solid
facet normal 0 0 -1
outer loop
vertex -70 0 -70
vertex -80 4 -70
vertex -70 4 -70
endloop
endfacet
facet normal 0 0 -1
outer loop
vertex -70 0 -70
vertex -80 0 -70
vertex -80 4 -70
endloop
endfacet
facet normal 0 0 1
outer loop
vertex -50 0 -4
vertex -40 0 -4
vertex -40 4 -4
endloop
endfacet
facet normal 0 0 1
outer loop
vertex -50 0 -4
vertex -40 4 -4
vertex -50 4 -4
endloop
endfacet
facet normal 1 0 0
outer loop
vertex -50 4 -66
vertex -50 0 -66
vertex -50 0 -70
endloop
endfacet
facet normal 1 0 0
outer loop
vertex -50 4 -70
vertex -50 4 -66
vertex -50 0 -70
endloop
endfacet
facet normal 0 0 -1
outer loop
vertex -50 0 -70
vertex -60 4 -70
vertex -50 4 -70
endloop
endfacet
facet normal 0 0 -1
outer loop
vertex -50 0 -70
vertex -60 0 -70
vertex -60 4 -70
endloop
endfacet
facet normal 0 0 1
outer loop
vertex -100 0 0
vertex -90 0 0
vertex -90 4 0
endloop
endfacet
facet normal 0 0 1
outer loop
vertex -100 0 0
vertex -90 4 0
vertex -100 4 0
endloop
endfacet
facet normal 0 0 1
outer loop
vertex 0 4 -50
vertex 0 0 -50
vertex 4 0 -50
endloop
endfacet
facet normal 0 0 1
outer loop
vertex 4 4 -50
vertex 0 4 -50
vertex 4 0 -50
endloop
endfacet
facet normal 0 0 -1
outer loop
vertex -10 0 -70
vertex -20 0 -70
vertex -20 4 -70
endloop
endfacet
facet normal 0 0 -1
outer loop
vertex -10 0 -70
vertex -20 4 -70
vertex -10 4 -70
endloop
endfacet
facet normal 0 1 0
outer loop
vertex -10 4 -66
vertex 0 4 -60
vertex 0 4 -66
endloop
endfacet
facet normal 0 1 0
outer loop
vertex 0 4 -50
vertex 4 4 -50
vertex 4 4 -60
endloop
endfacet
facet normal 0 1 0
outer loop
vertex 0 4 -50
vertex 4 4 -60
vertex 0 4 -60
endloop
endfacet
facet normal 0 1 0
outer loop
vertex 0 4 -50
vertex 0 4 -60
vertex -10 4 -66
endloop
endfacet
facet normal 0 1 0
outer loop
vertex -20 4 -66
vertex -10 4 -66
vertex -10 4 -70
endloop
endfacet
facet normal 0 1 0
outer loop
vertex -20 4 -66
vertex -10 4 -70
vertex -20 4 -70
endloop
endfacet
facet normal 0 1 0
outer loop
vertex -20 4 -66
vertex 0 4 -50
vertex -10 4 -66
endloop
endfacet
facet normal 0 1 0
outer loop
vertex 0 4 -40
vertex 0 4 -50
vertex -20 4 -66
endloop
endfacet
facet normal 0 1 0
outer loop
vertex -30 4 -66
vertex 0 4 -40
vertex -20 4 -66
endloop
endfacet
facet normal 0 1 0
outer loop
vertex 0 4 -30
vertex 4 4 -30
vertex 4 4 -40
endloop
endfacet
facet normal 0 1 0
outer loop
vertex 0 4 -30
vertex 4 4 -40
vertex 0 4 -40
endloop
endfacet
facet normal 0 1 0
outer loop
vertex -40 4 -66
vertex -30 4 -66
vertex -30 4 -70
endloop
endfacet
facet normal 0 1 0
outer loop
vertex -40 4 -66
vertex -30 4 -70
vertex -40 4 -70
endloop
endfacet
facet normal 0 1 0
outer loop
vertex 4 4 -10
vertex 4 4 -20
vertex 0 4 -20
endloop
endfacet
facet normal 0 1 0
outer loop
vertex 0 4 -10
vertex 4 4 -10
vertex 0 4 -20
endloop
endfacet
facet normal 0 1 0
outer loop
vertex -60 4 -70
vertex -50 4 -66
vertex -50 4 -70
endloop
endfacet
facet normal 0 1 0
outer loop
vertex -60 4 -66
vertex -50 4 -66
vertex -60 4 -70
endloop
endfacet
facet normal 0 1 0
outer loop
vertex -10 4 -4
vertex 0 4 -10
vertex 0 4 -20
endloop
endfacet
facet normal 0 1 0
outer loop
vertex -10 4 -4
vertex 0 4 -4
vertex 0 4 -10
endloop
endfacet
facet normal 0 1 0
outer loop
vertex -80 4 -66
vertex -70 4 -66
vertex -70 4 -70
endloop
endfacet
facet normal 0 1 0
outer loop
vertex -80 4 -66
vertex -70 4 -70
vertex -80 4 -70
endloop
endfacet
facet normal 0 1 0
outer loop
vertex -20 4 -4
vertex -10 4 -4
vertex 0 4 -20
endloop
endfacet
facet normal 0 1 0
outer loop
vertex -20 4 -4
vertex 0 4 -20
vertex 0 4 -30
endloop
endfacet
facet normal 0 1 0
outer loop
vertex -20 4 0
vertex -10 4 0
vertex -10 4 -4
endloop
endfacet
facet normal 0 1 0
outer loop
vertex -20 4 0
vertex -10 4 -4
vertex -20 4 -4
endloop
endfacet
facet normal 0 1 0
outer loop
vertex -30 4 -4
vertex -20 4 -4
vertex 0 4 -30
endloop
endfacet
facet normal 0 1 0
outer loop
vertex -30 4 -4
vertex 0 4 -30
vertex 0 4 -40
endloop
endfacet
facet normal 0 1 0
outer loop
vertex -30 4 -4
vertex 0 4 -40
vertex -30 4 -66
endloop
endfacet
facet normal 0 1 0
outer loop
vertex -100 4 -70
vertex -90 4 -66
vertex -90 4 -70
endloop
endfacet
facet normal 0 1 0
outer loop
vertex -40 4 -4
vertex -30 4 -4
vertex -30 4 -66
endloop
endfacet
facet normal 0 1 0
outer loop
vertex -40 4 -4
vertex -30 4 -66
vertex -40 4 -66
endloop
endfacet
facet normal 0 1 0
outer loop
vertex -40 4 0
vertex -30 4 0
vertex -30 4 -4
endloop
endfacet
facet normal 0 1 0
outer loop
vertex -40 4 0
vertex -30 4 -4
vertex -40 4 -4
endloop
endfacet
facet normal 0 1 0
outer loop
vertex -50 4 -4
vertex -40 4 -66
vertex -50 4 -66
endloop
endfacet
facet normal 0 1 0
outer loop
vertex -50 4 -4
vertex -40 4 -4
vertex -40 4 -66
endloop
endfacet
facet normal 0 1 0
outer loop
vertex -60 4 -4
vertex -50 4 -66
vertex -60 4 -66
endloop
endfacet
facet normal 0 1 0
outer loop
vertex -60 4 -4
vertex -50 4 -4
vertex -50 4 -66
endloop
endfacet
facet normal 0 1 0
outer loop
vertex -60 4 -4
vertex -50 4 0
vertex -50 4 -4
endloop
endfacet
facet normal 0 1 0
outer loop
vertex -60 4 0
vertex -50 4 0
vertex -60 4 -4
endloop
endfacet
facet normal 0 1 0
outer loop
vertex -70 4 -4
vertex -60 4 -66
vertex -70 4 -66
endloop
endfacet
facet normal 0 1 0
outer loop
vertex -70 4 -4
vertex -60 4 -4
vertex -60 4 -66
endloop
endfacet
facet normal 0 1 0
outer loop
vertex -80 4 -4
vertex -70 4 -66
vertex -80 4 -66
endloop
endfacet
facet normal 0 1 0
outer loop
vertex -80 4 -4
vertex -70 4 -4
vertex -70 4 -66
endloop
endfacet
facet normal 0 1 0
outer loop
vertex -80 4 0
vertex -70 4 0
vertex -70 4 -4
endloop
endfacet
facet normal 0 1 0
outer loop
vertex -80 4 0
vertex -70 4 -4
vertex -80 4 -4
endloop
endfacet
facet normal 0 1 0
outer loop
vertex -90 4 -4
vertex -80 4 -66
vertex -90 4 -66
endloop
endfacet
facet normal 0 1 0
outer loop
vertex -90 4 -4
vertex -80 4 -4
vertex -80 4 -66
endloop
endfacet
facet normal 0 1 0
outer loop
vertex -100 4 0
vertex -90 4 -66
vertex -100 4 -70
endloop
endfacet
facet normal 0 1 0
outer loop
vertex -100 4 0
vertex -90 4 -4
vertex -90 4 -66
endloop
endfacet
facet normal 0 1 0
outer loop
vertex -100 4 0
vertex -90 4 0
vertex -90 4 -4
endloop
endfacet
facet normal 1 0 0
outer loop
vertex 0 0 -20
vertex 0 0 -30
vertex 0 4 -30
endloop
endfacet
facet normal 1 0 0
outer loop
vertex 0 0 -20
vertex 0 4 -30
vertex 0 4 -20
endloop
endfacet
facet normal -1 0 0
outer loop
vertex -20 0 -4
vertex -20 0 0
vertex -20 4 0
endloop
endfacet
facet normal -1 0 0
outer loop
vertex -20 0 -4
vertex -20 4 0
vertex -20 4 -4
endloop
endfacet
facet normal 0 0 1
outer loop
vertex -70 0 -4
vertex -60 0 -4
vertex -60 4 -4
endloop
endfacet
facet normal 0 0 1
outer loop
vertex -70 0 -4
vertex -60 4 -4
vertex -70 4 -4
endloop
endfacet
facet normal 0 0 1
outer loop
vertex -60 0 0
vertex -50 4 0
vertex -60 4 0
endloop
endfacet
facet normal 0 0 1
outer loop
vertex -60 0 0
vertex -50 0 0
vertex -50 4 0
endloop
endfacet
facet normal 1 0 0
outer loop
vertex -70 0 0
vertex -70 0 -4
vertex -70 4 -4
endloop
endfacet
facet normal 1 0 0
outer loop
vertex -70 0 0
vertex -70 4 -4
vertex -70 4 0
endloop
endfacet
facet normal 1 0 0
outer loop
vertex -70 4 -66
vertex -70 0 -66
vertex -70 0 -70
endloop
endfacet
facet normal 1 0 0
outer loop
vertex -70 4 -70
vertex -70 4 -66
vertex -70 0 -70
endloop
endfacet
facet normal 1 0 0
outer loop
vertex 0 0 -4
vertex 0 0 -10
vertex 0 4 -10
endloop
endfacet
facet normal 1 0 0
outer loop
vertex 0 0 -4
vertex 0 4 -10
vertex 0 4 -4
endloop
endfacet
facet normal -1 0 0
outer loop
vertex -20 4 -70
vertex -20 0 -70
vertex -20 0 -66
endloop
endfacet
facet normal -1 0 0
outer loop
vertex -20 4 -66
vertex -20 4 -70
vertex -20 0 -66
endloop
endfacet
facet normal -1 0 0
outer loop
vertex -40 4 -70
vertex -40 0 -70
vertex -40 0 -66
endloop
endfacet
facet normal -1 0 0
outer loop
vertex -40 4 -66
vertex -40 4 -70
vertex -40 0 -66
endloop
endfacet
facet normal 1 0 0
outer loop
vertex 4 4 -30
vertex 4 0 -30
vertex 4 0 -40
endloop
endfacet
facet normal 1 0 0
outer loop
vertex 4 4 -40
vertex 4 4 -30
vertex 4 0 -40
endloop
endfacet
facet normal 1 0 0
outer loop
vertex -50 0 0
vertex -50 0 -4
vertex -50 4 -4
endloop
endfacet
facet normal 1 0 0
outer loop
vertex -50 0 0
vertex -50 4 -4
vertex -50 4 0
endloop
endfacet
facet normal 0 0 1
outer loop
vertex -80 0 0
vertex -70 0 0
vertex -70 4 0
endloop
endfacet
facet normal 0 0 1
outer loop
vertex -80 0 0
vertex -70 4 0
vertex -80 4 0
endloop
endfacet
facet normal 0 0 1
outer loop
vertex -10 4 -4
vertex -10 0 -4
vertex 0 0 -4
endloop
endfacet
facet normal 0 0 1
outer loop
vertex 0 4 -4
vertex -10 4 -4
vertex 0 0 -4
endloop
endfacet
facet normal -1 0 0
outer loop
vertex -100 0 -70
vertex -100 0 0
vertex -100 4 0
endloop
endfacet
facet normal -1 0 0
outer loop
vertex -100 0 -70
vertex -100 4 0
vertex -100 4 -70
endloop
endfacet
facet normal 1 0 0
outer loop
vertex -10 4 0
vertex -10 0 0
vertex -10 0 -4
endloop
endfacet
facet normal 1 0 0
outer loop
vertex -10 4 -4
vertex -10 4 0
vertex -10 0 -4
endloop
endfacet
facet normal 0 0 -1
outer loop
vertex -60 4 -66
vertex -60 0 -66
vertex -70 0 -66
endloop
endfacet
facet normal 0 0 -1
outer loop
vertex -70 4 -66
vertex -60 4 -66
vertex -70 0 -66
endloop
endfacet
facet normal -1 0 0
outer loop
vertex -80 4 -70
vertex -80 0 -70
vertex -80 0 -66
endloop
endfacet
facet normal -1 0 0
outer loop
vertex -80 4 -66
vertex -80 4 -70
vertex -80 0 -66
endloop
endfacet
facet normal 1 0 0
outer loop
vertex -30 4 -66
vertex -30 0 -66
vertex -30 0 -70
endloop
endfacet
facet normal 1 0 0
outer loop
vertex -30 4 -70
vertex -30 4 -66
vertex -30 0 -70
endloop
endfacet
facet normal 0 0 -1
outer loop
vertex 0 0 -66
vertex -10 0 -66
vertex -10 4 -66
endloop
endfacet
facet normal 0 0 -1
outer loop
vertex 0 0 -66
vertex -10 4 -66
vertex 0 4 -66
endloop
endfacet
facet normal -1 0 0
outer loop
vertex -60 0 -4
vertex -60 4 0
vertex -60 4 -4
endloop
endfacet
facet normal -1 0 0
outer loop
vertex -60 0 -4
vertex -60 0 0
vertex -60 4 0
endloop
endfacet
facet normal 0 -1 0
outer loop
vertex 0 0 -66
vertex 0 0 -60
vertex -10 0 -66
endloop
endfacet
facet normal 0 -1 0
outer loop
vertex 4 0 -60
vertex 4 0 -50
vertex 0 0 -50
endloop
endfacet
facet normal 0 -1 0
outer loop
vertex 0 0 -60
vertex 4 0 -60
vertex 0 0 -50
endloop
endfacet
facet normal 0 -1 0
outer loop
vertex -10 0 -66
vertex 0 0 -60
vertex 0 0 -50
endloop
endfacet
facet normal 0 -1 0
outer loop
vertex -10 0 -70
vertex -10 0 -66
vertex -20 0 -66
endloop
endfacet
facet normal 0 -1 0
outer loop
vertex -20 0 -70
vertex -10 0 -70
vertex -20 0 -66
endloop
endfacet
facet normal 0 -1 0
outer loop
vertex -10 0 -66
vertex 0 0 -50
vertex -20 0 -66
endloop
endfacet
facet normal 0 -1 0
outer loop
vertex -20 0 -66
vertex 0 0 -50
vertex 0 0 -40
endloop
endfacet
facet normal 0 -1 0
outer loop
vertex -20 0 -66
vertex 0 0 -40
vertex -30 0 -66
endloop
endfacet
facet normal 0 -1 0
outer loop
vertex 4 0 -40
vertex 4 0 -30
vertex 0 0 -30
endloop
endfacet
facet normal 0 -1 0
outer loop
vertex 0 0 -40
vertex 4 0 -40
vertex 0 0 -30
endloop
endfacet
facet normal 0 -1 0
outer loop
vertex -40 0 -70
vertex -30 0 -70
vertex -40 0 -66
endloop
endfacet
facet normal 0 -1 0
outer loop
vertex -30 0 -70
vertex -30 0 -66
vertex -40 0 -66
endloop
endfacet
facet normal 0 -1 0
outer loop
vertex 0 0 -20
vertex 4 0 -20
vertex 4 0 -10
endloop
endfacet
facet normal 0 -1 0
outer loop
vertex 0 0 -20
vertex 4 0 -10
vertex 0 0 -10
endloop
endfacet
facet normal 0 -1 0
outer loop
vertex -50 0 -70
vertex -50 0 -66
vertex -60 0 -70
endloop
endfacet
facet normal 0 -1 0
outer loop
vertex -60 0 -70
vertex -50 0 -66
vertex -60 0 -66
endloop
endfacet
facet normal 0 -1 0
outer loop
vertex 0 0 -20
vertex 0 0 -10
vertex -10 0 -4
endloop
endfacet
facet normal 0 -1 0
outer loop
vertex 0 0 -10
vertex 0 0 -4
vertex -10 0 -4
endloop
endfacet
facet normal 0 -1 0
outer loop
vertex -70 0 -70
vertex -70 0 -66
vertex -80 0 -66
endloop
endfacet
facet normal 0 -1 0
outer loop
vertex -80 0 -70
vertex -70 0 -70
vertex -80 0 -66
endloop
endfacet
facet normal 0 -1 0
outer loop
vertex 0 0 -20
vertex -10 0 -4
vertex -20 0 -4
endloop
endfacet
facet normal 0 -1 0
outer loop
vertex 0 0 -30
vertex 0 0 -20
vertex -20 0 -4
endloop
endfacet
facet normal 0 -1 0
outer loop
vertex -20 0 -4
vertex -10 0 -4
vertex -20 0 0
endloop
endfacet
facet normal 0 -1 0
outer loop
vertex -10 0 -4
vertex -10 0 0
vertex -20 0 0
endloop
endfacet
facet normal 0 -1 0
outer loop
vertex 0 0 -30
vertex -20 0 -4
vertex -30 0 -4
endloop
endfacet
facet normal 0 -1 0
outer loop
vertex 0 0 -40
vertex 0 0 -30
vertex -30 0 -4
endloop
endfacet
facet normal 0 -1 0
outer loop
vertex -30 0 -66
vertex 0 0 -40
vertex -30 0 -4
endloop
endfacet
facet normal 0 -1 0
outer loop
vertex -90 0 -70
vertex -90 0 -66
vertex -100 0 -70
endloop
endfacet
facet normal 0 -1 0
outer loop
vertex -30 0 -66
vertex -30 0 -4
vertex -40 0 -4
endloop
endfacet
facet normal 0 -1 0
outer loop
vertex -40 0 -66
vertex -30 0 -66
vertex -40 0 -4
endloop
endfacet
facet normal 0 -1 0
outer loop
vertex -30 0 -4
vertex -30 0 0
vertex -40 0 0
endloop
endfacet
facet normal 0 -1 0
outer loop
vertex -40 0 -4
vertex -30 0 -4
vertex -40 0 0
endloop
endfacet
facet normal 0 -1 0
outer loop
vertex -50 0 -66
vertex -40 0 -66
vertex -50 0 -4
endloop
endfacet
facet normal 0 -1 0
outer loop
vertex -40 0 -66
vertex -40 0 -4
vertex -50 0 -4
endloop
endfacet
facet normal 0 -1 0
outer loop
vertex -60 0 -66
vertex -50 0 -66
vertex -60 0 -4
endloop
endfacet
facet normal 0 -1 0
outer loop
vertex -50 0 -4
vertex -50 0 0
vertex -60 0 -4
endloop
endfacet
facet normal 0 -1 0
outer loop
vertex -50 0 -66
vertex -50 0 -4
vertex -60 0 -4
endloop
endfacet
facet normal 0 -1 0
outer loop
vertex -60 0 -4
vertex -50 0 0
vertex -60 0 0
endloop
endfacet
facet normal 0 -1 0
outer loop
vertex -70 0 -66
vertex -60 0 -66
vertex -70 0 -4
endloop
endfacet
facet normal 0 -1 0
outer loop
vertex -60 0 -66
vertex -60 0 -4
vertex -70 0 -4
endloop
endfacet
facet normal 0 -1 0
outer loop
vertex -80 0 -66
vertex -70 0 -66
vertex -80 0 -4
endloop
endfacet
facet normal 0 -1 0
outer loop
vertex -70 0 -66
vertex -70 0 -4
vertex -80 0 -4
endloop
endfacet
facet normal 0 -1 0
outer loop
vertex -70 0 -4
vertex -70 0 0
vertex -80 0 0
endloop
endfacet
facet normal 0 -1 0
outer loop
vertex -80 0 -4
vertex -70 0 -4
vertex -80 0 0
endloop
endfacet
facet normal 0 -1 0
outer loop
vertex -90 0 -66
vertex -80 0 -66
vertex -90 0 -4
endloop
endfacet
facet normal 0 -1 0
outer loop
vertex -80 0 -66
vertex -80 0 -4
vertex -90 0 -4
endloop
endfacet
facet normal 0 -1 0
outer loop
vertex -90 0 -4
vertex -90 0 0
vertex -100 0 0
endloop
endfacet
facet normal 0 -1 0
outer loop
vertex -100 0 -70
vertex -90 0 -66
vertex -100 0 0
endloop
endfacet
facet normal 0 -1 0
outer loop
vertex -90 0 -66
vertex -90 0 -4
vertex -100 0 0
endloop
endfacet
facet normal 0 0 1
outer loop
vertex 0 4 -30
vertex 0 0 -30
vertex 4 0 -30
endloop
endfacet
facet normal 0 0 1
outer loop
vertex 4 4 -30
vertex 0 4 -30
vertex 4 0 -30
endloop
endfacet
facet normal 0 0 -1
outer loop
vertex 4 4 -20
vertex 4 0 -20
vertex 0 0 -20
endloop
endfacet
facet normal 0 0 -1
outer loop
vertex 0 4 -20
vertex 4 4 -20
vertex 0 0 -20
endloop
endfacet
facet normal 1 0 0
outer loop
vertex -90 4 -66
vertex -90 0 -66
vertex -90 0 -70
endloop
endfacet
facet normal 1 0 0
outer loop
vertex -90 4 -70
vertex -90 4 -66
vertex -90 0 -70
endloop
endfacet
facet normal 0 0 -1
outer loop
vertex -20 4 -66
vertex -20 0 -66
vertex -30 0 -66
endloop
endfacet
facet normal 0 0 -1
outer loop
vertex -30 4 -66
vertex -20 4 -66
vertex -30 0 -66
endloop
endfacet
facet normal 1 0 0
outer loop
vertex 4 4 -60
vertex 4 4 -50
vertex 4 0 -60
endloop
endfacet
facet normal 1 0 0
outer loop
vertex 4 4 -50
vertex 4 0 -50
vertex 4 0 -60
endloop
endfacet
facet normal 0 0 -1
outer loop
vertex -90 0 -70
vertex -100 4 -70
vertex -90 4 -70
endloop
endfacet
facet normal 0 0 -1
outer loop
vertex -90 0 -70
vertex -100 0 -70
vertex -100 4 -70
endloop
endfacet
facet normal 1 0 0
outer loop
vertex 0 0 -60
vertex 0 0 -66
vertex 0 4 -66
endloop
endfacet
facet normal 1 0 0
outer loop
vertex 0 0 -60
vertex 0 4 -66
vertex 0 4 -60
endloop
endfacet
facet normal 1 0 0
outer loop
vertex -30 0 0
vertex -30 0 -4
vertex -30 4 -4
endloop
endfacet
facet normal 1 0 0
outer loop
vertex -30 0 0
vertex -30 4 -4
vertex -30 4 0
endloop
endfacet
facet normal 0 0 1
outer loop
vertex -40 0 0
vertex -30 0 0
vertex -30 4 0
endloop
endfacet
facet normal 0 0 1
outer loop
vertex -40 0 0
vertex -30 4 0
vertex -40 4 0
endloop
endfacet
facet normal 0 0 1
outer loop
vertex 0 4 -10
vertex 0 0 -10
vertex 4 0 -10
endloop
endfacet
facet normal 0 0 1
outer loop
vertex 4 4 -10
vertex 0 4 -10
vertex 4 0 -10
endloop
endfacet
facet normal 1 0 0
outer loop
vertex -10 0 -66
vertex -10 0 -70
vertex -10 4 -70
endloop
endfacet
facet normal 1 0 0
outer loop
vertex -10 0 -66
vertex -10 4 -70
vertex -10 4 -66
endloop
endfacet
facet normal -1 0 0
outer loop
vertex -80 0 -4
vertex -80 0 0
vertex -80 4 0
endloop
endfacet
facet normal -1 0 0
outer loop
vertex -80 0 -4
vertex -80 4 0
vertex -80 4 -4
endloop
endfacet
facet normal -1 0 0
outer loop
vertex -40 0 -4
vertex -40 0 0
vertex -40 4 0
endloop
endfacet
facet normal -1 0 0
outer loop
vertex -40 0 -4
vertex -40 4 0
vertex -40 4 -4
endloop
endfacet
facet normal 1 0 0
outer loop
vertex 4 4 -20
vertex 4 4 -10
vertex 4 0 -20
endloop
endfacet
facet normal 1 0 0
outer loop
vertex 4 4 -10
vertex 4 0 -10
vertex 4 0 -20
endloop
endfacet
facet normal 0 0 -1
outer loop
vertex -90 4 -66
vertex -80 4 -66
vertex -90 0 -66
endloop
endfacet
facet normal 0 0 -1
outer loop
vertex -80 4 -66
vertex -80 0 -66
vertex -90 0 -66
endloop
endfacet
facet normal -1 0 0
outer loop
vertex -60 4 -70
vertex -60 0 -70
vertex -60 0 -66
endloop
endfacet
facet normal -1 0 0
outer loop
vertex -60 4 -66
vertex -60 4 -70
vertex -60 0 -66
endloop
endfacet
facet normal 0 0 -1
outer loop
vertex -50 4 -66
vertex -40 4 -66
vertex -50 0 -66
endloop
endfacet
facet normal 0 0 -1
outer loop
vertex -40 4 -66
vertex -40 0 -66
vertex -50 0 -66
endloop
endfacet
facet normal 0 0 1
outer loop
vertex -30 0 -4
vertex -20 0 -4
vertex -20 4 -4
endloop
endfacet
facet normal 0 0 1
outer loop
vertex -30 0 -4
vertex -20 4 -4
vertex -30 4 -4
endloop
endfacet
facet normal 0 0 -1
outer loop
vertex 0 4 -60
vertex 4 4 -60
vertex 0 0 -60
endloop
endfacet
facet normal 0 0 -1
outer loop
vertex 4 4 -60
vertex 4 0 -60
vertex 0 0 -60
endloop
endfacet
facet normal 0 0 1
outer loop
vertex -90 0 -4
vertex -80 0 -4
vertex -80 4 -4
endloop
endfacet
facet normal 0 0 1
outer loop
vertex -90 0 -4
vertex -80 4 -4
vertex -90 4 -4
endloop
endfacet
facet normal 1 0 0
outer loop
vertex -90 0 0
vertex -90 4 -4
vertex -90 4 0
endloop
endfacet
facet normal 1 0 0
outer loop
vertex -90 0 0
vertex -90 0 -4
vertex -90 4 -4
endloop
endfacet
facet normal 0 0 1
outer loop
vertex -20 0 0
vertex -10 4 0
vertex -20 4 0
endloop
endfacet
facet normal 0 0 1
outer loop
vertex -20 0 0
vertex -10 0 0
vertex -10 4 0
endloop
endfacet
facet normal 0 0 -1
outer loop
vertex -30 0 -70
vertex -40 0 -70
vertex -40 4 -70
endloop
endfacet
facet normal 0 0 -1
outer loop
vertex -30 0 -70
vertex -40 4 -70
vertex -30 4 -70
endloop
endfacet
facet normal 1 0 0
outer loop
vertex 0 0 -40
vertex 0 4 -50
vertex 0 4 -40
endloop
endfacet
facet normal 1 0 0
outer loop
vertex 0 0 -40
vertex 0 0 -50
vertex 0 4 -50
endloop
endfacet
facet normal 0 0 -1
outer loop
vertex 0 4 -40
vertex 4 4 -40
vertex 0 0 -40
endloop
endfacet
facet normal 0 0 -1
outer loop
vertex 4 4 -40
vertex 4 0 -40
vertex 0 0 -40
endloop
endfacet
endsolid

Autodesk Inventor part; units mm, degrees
ref_plane "YZ Plane" through (0, 0, 0) normal (1, 0, 0) x (0, 1, 0)
ref_plane "XZ Plane" through (0, 0, 0) normal (0, 1, 0) x (-1, 0, 0)
ref_plane "XY Plane" through (0, 0, 0) normal (0, 0, 1) x (1, 0, 0)
sketch "スケッチ1" plane through (0, 0, 0) normal (0, 1, 0) x (-1, 0, 0)
  line L0 (0, 0) -> (100, 0)
  line L1 (100, 0) -> (100, -70)
  line L2 (100, -70) -> (0, -70)
  line L3 (0, -70) -> (0, 0)
  line L4 (0, -10) -> (-4, -10)
  line L5 (-4, -10) -> (-4, -20)
  line L6 (-4, -20) -> (0, -20)
  line L7 (0, -20) -> (0, -10)
  line L8 (0, -30) -> (-4, -30)
  line L9 (-4, -30) -> (-4, -40)
  line L10 (-4, -40) -> (0, -40)
  line L11 (0, -50) -> (-4, -50)
  line L12 (-4, -50) -> (-4, -60)
  line L13 (-4, -60) -> (0, -60)
  line L14 (0, 0) -> (10, 0)
  line L15 (10, 0) -> (10, -4)
  line L16 (10, -4) -> (0, -4)
  line L17 (0, -4) -> (0, 0)
  line L18 (0, -70) -> (10, -70)
  line L19 (10, -70) -> (10, -66)
  line L20 (10, -66) -> (0, -66)
  line L21 (0, -66) -> (0, -70)
  line L22 (30, 0) -> (20, 0)
  line L23 (20, 0) -> (20, -4)
  line L24 (20, -4) -> (30, -4)
  line L25 (30, -4) -> (30, 0)
  line L26 (30, -70) -> (20, -70)
  line L27 (20, -70) -> (20, -66)
  line L28 (20, -66) -> (30, -66)
  line L29 (30, -66) -> (30, -70)
  line L30 (50, -4) -> (50, 0)
  line L31 (40, -4) -> (50, -4)
  line L32 (40, 0) -> (40, -4)
  line L33 (50, -66) -> (50, -70)
  line L34 (40, -66) -> (50, -66)
  line L35 (40, -70) -> (40, -66)
  line L36 (70, -4) -> (70, 0)
  line L37 (60, -4) -> (70, -4)
  line L38 (60, 0) -> (60, -4)
  line L39 (70, -66) -> (70, -70)
  line L40 (60, -66) -> (70, -66)
  line L41 (60, -70) -> (60, -66)
  line L42 (90, -4) -> (90, 0)
  line L43 (80, -4) -> (90, -4)
  line L44 (80, 0) -> (80, -4)
  line L45 (90, -66) -> (90, -70)
  line L46 (80, -66) -> (90, -66)
  line L47 (80, -70) -> (80, -66)
  point P0 (20, -2)
  point P1 (40, -2)
  point P2 (60, -2)
  point P3 (80, -2)
  point P4 (0, -20)
  point P5 (0, -40)
  point P6 (0, -60)
  dimension "d0" = 100
  dimension "d1" = 70
  dimension "d2" = 4
  dimension "d3" = 10
  dimension "d4" = 10
  dimension "d7" = 20
  dimension "d12" = 10
  dimension "d13" = 4
  dimension "d14" = 10
  dimension "d15" = 4
  dimension "d16" = 10
  dimension "d17" = 10
  dimension "d18" = 10
  dimension "d21" = 20
extrude "押し出し1" add sketch "スケッチ1" along normal blind 4 contours L0 L23 L24 L25 L32 L31 L30 L38 L37 L36 L44 L43 L42 L1 L2 L45 L46 L47 L39 L40 L41 L33 L34 L35 L29 L28 L27 L19 L20 L3 L16 L15 | L3 L6 L5 L4 | L3 L10 L9 L8 | L3 L13 L12 L11
properties part number "ER_lipo_back_1" material "木材 (オーク)"
